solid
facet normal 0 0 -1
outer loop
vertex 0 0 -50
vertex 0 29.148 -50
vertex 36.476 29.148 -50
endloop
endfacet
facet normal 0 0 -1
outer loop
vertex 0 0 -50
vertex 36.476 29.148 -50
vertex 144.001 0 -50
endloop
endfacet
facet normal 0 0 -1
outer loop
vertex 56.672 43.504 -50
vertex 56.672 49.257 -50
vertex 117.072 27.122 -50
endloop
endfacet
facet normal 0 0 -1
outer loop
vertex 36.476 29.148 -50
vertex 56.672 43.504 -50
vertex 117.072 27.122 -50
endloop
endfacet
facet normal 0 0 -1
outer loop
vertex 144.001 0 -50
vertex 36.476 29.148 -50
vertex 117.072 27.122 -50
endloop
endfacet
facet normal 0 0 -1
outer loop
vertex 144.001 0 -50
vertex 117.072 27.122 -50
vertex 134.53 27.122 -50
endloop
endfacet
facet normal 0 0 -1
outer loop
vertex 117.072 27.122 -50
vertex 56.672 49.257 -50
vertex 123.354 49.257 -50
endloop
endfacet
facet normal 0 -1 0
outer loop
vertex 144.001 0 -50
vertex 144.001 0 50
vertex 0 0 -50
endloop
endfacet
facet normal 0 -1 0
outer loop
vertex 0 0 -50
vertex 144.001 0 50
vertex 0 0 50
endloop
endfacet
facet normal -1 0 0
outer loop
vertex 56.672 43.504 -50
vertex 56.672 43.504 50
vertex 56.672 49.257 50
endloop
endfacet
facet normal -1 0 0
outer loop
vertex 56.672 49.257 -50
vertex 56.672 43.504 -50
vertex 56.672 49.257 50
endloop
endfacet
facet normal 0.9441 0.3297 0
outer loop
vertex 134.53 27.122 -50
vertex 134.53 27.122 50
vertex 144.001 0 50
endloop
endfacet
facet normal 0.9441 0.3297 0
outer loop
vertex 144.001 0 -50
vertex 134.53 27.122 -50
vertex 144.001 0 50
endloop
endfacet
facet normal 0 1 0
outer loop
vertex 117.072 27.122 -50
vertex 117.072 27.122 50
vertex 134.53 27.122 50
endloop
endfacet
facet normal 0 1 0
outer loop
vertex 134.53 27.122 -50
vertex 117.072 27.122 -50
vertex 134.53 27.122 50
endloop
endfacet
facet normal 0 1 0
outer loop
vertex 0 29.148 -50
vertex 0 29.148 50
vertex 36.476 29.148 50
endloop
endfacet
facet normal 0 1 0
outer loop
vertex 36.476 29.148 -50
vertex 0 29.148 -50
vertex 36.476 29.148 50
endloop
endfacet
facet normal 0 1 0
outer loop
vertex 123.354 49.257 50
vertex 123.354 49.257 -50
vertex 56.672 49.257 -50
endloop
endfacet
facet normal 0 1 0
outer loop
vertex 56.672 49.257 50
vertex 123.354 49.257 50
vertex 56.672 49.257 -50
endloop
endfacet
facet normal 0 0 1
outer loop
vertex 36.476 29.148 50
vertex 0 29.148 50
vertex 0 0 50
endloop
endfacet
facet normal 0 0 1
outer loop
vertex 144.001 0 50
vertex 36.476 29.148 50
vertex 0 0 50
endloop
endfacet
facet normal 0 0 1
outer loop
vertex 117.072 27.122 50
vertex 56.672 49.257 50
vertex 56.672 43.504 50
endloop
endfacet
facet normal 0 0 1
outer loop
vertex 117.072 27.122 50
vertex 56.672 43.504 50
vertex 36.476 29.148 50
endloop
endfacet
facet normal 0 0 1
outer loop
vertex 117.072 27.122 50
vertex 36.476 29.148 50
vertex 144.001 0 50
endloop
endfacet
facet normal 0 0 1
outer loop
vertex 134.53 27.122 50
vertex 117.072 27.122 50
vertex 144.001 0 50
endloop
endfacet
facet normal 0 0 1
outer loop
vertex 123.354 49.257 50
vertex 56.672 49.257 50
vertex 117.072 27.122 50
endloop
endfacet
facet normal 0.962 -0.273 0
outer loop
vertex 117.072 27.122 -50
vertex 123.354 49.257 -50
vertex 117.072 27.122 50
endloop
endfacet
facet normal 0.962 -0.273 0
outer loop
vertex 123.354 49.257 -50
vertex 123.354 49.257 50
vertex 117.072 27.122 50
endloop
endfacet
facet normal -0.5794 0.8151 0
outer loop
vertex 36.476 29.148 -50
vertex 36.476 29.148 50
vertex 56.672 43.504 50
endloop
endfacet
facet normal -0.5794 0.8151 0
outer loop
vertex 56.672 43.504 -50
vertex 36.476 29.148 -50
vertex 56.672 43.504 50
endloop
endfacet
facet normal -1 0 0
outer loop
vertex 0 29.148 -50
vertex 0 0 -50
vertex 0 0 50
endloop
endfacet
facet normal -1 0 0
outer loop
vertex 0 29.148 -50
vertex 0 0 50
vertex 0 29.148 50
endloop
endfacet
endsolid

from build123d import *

# Parameters (mm, degrees)
SKETCH_1_R                     = 27.218239916
EXTRUDE_1_DEPTH                = 50
SPLIT_BODIES_1_SURFACE_1_BACK  = 231.852
SPLIT_BODIES_1_SURFACE_1_DEPTH = 463.704
SPLIT_BODIES_1_SURFACE_2_BACK  = 231.852
SPLIT_BODIES_1_SURFACE_2_DEPTH = 463.704


with BuildPart() as part:
    # 草图1 → 凸台-拉伸1 (new, symmetric)
    with BuildSketch(Plane.XY):
        with Locations((126.841, 106.1775)):
            Circle(SKETCH_1_R)
        with BuildLine():
            Line((36.476006197, 29.147891414), (56.67204093, 43.504108875))
            Line((56.67204093, 43.504108875), (56.67204093, 93.307484045))
            Line((56.67204093, 93.307484045), (92.496172884, 93.307484045))
            ThreePointArc((92.496172884, 93.307484045), (88.507151815, 108.556758389), (81.393508143, 122.622629526))
            ThreePointArc((81.393508143, 122.622629526), (81.328816917, 131.844883349), (89.661, 135.798220622))
            Line((89.661, 135.798220622), (152.57565846, 127.931864381))
            ThreePointArc((152.57565846, 127.931864381), (156.589044848, 125.482703859), (157.411382406, 120.853511867))
            Line((157.411382406, 120.853511867), (139.303205185, 49.257428232))
            Line((139.303205185, 49.257428232), (123.353516134, 49.257428232))
            Line((123.353516134, 49.257428232), (117.072161438, 27.122156161))
            Line((117.072161438, 27.122156161), (134.529857437, 27.122156161))
            Line((134.529857437, 27.122156161), (144.001, 0))
            Line((144.001, 0), (0, 0))
            Line((0, 0), (0, 29.147891414))
            Line((0, 29.147891414), (36.476006197, 29.147891414))
        make_face()
    extrude(amount=EXTRUDE_1_DEPTH, both=True)


with BuildPart() as body_2:
    # Split Bodies 1: the piece behind the surface
    add(part.part)
    # Split Bodies 1 surface: a surface, the sketch's curves swept straight by 463.704 mm
    with BuildLine(Plane.XY.offset(50).offset(-SPLIT_BODIES_1_SURFACE_1_BACK), mode=Mode.PRIVATE) as split_bodies_1_surface_1_path:
        Line((123.353516134, 49.257428232), (56.67204093, 49.257428232))
    split_bodies_1_surface_1 = Shell.extrude(split_bodies_1_surface_1_path.wire(), (0 * SPLIT_BODIES_1_SURFACE_1_DEPTH, 0 * SPLIT_BODIES_1_SURFACE_1_DEPTH, 1 * SPLIT_BODIES_1_SURFACE_1_DEPTH))
    split(bisect_by=split_bodies_1_surface_1, keep=Keep.BOTTOM)


with BuildPart() as part_1:
    add(part.part)

    # Split Bodies 1: split by a surface, the side it looks to stays
    # Split Bodies 1 surface: a surface, the sketch's curves swept straight by 463.704 mm
    with BuildLine(Plane.XY.offset(50).offset(-SPLIT_BODIES_1_SURFACE_2_BACK), mode=Mode.PRIVATE) as split_bodies_1_surface_2_path:
        Line((123.353516134, 49.257428232), (56.67204093, 49.257428232))
    split_bodies_1_surface_2 = Shell.extrude(split_bodies_1_surface_2_path.wire(), (0 * SPLIT_BODIES_1_SURFACE_2_DEPTH, 0 * SPLIT_BODIES_1_SURFACE_2_DEPTH, 1 * SPLIT_BODIES_1_SURFACE_2_DEPTH))
    split(bisect_by=split_bodies_1_surface_2, keep=Keep.TOP)


solid = part_1.part
